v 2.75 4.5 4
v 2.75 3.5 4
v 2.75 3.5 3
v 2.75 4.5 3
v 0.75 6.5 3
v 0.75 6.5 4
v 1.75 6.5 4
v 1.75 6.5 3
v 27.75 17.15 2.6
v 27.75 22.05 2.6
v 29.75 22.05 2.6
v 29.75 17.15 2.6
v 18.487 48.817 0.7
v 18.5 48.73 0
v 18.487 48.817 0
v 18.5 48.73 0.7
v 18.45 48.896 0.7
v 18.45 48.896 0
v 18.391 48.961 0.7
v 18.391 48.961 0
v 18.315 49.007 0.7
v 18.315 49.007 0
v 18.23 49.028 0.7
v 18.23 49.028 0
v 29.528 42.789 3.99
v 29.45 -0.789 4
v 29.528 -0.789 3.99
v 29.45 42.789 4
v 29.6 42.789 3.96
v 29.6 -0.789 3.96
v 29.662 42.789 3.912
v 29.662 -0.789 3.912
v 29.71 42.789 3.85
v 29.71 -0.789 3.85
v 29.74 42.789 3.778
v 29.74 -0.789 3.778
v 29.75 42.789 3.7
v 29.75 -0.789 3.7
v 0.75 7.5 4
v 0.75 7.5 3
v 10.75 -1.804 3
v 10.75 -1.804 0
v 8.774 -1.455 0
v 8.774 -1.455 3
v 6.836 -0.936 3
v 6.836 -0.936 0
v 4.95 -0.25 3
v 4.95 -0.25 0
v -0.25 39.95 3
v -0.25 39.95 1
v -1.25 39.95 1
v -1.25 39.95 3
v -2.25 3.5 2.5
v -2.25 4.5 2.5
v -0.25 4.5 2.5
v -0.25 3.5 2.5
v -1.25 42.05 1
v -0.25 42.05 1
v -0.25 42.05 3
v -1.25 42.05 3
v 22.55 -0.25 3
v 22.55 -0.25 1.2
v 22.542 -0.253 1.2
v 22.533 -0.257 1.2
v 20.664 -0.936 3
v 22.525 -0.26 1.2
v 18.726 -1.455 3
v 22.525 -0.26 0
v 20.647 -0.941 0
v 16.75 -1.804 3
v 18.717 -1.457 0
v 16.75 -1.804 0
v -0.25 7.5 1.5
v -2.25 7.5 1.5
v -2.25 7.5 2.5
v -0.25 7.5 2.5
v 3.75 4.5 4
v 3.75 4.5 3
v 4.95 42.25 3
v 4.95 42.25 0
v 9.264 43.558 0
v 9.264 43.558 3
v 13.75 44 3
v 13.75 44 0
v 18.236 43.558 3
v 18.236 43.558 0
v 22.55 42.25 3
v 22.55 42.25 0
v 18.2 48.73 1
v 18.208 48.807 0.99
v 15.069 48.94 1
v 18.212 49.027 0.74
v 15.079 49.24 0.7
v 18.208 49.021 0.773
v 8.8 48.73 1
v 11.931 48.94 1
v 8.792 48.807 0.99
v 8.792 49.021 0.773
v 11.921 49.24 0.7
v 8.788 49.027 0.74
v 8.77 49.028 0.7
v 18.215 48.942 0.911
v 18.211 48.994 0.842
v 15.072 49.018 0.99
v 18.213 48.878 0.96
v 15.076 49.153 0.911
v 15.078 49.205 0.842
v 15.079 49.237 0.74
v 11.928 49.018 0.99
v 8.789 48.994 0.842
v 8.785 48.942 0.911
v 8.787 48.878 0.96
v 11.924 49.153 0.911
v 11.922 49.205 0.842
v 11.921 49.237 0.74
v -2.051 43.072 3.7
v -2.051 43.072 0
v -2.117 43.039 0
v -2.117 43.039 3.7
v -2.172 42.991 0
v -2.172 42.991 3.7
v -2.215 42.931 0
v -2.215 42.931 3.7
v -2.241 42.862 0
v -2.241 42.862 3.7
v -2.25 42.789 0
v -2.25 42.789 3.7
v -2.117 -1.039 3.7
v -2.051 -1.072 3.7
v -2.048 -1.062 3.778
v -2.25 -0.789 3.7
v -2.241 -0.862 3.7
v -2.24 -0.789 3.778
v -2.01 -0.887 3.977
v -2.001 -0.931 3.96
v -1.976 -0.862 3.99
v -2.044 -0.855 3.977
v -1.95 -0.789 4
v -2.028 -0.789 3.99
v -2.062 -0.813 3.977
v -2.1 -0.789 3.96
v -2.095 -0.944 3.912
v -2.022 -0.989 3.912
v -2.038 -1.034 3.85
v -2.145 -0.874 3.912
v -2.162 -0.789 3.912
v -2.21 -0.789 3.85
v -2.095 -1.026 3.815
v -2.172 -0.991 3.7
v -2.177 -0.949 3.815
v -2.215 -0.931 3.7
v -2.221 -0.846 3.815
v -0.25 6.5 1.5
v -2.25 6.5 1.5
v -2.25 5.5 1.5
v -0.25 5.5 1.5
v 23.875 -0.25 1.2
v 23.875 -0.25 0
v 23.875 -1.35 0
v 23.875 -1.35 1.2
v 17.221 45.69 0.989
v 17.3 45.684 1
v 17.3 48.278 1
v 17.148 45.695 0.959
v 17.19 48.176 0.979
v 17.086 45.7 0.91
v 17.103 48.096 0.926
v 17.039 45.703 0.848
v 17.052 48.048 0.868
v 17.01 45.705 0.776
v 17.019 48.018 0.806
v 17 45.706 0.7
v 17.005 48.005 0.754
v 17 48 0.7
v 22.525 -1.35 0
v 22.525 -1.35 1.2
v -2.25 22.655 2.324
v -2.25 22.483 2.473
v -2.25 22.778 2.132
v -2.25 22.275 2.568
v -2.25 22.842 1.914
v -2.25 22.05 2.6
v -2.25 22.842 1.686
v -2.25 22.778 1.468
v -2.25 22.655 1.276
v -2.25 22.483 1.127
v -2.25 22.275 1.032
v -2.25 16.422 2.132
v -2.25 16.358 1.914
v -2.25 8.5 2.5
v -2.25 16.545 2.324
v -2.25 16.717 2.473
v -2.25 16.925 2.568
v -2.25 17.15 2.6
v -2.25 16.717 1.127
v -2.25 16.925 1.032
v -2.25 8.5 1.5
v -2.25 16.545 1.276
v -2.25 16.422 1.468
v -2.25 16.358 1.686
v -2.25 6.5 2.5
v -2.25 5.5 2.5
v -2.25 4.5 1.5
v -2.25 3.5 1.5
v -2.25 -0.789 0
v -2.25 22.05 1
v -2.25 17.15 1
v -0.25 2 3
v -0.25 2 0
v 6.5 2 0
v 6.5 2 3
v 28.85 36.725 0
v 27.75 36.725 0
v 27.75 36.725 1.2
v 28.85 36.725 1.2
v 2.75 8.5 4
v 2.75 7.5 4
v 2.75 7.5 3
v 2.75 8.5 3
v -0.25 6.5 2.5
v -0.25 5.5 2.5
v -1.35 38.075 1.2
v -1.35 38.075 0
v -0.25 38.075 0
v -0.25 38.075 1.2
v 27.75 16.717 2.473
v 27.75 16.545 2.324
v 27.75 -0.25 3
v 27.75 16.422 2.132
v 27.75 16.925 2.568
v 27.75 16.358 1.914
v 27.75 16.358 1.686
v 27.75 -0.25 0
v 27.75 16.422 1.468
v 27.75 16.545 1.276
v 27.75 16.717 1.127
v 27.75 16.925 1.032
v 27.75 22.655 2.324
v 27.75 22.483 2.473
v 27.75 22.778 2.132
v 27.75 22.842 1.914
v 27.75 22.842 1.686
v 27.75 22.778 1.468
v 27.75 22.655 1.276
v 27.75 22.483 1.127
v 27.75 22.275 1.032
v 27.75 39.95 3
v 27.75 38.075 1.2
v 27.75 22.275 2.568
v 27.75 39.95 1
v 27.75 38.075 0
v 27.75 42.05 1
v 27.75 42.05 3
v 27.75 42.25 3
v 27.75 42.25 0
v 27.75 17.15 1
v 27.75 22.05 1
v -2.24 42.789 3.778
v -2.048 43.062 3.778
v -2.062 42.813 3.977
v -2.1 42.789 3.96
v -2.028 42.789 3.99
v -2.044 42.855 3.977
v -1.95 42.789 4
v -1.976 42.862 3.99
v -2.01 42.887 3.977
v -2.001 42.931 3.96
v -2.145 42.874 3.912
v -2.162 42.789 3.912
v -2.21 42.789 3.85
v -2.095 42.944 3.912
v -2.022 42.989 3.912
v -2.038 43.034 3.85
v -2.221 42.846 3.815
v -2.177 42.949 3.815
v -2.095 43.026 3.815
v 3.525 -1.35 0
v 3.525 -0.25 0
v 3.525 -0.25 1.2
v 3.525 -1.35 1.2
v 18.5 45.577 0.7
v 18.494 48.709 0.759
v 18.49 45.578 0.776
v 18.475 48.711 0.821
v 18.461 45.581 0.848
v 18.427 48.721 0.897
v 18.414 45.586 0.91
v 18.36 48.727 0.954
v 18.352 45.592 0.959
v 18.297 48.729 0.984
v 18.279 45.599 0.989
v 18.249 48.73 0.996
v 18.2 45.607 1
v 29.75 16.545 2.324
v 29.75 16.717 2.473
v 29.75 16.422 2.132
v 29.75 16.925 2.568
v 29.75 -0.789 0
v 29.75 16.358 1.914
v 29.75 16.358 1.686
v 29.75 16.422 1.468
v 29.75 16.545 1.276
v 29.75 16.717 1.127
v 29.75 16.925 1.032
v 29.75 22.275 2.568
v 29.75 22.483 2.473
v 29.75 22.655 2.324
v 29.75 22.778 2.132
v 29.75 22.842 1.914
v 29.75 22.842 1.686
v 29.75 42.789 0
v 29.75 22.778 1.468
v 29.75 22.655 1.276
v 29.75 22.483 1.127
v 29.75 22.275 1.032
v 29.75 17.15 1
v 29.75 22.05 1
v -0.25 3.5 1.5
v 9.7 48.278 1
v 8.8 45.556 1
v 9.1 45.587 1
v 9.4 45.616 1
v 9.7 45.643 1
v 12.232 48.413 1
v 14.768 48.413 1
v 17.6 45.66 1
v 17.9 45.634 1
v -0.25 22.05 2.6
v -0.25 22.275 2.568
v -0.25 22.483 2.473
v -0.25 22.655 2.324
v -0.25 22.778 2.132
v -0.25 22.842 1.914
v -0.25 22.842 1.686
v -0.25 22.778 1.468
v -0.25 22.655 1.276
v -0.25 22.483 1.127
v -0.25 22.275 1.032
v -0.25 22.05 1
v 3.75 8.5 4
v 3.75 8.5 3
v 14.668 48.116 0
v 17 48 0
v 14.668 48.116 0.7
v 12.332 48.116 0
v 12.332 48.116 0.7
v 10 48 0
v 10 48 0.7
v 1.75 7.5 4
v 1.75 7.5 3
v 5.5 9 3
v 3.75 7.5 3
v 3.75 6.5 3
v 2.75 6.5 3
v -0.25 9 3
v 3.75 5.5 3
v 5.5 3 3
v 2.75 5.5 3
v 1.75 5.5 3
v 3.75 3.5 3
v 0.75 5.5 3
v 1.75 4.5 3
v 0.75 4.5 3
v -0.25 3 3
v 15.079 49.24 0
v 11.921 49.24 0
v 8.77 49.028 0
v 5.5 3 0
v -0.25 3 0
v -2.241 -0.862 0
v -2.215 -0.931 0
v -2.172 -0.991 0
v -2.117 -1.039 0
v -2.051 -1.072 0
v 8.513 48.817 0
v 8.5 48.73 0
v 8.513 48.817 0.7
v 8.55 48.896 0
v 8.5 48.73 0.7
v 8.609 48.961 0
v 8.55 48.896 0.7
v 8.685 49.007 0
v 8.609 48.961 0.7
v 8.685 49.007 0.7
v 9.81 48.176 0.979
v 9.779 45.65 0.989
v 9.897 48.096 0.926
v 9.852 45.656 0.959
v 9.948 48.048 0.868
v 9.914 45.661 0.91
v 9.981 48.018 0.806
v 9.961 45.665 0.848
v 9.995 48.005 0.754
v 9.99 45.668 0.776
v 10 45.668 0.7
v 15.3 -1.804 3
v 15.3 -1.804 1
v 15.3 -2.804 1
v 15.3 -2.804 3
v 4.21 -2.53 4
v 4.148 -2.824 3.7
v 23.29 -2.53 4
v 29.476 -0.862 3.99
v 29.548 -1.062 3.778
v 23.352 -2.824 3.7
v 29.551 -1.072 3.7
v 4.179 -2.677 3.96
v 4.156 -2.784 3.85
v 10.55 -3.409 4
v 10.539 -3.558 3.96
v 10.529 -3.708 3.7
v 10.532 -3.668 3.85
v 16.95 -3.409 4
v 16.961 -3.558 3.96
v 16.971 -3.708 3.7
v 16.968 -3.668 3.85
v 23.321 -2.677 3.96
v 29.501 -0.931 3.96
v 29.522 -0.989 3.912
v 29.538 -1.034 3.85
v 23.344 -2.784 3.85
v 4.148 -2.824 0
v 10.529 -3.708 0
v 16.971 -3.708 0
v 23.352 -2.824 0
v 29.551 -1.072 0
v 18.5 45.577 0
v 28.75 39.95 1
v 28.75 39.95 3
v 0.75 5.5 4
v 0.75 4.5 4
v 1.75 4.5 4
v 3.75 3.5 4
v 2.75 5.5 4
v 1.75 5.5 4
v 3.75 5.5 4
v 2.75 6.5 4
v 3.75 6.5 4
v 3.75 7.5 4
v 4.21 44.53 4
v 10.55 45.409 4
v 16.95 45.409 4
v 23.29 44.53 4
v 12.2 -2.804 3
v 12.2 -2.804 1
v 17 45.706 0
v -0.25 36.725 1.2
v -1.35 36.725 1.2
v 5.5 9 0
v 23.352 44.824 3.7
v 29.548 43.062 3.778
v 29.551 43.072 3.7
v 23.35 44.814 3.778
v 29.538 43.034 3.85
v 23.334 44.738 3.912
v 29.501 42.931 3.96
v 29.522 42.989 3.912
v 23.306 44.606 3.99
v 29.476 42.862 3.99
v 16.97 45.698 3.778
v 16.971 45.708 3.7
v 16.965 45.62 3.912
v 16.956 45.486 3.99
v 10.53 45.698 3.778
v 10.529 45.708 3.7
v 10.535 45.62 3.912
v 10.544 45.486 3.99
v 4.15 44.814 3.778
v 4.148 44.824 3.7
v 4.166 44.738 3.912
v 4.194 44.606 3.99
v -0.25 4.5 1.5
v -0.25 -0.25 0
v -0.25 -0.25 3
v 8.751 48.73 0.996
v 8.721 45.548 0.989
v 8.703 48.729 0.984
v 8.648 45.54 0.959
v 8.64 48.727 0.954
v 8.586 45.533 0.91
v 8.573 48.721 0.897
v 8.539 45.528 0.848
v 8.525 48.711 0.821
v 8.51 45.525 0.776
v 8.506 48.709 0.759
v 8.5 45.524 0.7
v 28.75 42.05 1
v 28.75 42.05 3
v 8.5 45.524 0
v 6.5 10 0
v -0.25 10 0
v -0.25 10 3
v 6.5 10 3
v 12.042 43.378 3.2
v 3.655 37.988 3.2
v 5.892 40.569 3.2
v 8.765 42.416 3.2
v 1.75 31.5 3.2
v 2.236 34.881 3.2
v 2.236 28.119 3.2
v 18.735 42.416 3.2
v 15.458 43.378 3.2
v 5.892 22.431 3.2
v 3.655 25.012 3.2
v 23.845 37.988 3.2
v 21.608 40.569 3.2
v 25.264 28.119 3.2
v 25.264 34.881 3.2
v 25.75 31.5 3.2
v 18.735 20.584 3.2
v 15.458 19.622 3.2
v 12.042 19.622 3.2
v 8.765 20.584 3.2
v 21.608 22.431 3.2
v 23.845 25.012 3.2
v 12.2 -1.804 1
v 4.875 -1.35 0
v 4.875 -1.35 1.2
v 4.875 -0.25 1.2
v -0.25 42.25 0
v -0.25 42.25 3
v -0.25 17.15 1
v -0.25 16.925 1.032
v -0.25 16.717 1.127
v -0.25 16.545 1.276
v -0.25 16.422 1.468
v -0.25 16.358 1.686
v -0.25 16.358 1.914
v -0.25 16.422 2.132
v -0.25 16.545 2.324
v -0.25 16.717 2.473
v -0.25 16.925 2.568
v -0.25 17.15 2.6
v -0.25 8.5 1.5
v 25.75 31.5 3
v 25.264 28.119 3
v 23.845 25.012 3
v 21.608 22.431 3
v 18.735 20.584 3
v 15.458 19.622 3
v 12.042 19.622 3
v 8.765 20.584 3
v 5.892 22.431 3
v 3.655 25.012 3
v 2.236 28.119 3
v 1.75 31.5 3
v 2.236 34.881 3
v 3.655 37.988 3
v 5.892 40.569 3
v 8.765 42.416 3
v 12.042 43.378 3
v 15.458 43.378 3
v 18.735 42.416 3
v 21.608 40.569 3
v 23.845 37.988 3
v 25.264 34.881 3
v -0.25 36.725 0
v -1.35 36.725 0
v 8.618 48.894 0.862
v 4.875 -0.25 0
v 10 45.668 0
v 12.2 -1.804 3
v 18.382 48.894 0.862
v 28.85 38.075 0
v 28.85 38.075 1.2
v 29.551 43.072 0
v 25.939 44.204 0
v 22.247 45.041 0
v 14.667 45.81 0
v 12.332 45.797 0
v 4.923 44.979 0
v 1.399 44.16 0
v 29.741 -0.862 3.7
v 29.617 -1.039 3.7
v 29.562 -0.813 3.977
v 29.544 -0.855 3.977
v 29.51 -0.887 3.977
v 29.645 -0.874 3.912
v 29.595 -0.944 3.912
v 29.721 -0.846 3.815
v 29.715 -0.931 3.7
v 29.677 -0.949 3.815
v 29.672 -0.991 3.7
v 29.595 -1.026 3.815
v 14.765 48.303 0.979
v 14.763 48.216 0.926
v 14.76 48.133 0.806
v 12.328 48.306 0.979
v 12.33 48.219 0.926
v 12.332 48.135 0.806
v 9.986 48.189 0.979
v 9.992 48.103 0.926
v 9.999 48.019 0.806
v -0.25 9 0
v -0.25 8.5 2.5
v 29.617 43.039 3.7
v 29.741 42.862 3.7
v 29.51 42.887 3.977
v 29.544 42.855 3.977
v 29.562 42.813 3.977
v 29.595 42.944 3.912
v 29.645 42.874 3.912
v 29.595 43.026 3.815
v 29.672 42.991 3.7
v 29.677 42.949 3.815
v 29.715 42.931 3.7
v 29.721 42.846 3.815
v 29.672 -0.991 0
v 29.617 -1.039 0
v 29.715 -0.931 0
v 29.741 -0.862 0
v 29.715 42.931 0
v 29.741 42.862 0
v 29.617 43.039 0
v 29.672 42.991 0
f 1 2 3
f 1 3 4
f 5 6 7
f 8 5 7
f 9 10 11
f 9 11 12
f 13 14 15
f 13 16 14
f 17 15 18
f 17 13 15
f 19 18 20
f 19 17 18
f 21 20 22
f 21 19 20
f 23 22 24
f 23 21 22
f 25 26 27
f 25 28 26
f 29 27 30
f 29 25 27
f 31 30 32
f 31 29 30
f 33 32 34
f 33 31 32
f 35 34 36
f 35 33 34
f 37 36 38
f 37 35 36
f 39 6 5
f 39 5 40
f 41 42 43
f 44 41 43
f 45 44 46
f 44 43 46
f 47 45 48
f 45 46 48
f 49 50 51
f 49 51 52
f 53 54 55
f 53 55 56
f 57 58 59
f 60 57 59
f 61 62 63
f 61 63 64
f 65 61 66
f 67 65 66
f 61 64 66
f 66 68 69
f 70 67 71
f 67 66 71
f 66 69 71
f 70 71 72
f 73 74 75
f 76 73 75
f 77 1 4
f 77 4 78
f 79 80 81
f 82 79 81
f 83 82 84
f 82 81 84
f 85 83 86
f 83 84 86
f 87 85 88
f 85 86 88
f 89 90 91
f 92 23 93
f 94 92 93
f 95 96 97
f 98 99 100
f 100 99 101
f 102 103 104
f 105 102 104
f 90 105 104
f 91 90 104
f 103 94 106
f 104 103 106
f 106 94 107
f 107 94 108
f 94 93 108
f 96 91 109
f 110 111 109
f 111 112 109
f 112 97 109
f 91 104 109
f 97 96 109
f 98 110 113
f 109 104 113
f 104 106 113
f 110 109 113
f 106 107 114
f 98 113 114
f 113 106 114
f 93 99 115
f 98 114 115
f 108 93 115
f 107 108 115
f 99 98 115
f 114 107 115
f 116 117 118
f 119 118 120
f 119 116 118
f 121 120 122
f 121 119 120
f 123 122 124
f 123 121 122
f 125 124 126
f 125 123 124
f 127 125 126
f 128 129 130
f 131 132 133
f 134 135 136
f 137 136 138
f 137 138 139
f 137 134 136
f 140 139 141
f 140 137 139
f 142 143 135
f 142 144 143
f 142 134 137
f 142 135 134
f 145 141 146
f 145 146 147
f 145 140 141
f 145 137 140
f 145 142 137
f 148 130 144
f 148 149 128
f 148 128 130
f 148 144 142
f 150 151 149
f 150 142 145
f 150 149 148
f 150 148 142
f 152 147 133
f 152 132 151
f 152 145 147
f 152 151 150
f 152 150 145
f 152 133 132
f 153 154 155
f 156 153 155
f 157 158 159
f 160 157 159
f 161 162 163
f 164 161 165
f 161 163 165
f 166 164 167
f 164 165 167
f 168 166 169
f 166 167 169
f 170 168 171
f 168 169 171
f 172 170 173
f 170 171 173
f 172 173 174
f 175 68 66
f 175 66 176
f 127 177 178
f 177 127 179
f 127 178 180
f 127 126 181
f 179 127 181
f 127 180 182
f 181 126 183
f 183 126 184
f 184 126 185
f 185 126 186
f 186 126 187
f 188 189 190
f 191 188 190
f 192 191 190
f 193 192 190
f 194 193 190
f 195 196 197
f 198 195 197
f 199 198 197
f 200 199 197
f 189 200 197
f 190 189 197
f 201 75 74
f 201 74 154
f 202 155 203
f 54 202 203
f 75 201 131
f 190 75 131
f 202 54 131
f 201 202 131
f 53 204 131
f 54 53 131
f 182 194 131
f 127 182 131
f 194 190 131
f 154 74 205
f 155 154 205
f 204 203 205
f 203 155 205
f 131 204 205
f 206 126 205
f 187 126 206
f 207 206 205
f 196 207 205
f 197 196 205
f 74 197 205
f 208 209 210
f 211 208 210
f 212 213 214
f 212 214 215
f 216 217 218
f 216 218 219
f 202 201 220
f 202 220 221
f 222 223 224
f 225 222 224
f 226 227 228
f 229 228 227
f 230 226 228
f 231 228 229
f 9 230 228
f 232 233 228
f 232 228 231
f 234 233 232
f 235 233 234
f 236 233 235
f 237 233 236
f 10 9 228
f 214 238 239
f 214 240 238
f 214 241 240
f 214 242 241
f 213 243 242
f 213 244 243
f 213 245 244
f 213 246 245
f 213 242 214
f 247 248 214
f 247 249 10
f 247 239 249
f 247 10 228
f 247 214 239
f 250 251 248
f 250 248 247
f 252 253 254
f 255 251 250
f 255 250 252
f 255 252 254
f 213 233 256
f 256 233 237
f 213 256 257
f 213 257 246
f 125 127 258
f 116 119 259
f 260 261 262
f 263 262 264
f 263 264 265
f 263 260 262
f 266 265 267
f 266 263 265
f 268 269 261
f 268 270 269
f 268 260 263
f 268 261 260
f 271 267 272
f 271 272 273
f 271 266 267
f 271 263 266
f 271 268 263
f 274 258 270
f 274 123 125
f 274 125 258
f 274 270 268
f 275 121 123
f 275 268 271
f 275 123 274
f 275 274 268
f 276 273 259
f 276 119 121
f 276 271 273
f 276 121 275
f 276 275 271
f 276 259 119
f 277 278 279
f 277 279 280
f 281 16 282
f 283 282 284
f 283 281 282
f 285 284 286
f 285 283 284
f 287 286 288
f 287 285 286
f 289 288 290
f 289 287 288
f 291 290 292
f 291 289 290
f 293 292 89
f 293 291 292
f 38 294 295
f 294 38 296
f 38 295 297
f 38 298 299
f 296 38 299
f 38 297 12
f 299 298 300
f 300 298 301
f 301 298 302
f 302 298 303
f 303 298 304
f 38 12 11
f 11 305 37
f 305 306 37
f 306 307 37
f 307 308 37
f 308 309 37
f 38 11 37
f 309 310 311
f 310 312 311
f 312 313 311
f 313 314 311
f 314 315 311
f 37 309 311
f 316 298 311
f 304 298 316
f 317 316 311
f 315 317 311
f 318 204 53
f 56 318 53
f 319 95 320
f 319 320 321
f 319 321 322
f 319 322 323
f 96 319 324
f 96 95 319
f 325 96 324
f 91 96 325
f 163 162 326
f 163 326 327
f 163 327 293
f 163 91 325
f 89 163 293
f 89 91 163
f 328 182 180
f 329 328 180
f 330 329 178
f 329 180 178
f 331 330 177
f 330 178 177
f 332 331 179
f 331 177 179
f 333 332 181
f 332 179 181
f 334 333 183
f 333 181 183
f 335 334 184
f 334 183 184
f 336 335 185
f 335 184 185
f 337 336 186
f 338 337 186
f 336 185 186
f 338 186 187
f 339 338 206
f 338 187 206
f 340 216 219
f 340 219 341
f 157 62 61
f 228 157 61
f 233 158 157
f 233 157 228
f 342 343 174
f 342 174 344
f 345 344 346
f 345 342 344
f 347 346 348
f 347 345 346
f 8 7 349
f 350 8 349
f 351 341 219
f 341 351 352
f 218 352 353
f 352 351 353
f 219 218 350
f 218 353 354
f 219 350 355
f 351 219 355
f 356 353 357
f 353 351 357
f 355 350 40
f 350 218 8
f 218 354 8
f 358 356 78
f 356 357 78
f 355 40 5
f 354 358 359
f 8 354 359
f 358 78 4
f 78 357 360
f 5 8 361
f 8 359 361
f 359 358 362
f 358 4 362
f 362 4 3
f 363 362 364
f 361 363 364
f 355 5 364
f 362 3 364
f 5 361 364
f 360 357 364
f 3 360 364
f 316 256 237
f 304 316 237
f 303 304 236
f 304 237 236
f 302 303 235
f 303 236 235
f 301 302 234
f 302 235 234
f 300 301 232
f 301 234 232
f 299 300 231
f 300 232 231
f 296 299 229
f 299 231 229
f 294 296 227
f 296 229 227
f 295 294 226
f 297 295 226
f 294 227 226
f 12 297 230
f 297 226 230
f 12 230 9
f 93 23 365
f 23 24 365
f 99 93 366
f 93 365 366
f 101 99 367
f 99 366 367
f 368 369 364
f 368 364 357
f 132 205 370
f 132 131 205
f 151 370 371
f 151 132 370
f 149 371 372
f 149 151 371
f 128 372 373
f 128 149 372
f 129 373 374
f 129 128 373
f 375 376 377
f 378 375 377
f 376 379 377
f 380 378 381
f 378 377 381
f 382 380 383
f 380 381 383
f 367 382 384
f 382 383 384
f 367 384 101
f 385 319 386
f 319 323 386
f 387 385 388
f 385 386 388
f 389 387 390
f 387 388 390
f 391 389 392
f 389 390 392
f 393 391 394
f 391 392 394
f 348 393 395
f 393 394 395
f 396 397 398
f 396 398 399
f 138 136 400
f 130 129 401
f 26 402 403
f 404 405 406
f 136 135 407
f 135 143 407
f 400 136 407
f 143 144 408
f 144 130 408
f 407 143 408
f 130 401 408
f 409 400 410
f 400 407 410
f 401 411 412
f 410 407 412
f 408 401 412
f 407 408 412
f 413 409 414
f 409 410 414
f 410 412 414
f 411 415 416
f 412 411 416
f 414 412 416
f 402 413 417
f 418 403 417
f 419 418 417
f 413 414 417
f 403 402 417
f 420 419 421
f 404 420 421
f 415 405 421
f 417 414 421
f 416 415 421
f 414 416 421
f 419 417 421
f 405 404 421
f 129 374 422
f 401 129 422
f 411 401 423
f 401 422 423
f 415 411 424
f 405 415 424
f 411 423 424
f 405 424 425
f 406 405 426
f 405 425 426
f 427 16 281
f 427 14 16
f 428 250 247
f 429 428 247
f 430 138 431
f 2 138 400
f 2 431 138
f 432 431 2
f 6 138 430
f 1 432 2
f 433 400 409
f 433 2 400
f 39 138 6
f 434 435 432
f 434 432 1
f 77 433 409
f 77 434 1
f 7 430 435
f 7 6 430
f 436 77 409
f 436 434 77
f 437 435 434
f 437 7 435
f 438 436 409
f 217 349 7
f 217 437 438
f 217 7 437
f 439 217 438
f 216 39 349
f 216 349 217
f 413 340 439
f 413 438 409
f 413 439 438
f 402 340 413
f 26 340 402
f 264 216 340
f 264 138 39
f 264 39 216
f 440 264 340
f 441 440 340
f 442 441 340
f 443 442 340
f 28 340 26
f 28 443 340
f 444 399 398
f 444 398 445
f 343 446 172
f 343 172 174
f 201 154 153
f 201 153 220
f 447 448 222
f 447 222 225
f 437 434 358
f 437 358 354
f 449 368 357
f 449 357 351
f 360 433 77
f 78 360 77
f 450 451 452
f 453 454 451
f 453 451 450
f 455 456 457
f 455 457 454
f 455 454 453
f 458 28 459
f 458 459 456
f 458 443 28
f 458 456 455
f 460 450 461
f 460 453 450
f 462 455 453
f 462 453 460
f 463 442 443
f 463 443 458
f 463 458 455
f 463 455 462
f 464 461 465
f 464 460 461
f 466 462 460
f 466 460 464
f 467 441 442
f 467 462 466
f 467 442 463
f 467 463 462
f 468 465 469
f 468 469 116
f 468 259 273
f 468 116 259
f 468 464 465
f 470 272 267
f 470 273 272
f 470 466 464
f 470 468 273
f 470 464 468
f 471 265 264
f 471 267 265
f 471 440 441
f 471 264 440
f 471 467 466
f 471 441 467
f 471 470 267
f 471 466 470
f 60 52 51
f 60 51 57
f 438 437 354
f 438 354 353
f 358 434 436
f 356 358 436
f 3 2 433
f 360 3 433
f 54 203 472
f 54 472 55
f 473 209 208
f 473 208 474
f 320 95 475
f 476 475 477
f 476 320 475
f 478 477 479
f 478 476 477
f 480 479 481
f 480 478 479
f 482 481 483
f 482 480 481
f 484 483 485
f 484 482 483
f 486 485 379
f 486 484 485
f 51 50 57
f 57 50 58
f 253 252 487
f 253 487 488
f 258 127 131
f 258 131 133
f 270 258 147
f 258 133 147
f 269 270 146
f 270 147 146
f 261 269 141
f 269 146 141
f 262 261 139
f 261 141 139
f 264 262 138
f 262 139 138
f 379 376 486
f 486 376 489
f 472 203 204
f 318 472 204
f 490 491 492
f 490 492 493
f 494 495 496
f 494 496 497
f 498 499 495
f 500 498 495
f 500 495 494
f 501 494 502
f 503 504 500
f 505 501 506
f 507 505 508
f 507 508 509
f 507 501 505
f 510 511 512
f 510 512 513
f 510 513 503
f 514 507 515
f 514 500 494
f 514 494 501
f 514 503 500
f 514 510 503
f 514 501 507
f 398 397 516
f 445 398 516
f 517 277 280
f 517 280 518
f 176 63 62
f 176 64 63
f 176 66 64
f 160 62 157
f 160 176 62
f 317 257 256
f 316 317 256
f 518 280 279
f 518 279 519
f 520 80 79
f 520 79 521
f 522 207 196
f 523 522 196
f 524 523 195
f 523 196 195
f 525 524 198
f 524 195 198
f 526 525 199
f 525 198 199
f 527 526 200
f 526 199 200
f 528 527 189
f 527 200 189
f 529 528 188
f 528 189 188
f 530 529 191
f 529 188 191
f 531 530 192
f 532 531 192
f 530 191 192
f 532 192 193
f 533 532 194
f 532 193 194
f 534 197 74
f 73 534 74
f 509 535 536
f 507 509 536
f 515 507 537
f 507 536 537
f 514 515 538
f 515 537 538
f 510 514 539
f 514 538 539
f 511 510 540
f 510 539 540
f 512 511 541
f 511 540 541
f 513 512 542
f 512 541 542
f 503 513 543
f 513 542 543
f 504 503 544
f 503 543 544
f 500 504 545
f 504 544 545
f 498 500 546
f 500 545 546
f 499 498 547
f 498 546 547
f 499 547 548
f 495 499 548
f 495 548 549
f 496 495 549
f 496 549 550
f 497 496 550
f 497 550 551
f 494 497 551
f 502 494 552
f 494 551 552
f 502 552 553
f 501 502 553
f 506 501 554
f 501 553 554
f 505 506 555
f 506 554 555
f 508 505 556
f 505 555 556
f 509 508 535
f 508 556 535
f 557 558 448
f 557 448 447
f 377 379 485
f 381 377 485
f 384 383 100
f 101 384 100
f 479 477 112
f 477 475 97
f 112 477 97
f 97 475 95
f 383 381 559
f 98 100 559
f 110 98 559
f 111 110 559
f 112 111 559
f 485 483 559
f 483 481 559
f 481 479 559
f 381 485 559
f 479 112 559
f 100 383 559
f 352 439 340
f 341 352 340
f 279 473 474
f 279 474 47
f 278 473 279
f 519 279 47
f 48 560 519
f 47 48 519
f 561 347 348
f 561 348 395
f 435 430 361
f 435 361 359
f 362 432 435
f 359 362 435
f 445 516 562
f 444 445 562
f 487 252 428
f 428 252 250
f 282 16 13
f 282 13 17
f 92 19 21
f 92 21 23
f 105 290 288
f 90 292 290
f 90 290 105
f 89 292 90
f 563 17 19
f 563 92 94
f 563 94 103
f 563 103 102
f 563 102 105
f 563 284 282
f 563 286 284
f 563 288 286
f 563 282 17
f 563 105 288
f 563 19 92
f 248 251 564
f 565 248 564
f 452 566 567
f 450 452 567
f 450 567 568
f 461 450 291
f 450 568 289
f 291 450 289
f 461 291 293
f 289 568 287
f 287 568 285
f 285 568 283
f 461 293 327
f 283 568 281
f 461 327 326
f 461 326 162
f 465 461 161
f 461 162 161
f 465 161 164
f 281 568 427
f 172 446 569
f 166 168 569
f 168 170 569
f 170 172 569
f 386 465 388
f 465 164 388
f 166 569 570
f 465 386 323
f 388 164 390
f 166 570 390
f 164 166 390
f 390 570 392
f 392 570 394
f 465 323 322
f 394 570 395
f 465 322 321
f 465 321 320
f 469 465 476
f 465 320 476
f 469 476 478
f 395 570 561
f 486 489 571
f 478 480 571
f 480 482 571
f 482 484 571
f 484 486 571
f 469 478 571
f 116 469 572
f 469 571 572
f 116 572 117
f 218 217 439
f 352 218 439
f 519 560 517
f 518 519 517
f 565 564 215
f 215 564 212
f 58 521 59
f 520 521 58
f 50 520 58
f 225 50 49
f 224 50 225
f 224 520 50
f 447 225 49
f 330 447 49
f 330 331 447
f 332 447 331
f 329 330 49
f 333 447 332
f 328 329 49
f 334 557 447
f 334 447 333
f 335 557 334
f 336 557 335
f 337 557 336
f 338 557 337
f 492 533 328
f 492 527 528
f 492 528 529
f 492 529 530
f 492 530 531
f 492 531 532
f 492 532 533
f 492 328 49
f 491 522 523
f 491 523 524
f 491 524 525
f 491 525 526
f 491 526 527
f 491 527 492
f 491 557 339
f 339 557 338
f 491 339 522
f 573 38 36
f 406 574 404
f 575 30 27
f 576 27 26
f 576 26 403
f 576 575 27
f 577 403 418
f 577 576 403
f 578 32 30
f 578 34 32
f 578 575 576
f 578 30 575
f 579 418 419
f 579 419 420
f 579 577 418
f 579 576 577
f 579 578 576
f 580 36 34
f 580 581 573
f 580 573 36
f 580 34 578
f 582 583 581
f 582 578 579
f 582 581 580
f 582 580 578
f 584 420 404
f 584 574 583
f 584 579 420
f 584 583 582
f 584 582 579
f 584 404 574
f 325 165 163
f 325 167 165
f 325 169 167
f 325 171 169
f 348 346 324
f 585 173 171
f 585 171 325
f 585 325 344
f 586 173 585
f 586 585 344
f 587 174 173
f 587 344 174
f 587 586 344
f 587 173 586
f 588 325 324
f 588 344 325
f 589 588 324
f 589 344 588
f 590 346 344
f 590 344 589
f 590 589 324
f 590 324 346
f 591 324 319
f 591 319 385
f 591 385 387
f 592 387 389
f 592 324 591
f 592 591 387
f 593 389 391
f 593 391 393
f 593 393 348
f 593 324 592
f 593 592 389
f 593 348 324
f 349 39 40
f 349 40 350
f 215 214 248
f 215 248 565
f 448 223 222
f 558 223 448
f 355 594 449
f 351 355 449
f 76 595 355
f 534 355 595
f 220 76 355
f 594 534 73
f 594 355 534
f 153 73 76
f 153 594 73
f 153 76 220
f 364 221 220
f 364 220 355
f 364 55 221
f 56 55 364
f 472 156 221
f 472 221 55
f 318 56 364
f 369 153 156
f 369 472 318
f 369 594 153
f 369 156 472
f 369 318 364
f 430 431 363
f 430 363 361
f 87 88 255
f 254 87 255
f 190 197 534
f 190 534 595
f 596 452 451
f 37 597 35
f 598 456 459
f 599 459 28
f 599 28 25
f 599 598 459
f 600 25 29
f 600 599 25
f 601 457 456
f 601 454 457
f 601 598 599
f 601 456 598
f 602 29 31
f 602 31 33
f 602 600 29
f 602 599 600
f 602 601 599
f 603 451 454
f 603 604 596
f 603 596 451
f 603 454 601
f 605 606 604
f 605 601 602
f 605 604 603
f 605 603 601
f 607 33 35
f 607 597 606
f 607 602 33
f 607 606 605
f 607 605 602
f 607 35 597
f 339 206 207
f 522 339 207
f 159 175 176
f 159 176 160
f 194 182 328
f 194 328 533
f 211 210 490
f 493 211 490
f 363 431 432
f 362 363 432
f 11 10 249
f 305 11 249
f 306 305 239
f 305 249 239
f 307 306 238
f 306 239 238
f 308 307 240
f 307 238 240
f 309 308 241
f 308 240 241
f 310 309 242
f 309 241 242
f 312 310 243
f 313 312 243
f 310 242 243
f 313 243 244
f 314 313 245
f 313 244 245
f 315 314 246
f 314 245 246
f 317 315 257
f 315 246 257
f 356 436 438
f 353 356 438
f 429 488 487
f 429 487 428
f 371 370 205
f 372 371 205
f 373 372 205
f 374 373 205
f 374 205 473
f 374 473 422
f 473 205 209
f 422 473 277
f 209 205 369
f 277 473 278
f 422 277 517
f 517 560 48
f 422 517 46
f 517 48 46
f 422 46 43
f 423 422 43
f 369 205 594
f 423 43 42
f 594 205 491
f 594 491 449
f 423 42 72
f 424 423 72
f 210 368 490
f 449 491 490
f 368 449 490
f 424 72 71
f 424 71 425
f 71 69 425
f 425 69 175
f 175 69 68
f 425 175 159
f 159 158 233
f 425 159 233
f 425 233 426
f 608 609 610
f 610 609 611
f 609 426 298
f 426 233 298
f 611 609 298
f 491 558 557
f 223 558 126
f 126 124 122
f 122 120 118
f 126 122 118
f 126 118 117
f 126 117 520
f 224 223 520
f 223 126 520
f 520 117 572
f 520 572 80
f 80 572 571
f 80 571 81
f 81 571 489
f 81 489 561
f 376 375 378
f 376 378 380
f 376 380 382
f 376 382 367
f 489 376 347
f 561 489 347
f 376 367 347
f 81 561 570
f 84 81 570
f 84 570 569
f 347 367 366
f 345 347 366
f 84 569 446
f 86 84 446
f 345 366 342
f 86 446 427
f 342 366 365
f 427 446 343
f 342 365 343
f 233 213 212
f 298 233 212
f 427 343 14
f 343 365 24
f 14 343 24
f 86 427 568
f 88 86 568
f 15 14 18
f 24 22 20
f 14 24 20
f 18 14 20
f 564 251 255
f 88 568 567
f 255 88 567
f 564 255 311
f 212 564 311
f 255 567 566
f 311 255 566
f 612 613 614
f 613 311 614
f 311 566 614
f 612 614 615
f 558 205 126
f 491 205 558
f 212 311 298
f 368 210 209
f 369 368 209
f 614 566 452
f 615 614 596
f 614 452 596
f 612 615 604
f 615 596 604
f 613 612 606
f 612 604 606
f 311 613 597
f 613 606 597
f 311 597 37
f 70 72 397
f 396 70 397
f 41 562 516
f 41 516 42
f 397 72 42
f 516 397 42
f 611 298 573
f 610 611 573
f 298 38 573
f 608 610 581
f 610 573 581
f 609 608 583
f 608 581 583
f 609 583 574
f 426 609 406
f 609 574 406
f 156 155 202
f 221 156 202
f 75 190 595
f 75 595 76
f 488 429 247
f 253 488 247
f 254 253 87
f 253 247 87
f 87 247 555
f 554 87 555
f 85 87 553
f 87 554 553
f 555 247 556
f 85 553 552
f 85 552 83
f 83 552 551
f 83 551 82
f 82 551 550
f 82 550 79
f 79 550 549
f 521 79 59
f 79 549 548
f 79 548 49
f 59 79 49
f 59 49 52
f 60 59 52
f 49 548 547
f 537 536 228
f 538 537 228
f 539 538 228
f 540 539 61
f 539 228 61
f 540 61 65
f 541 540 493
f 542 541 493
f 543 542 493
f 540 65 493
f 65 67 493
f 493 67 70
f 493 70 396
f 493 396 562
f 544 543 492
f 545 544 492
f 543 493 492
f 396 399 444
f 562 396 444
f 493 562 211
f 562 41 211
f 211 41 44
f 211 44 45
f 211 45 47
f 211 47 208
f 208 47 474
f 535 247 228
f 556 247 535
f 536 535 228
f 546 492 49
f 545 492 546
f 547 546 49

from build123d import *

# Parameters (mm, degrees)
PAD_DEPTH       = 4
POCKET003_DEPTH = 3
POCKET004_DEPTH = 32.001
SKETCH012_W     = 3.1
SKETCH012_H     = 2
POCKET006_DEPTH = 1
SKETCH013_W     = 2.1
SKETCH013_H     = 2
POCKET007_DEPTH = 1
SKETCH014_W     = 2.1
SKETCH014_H     = 2
POCKET008_DEPTH = 1
SKETCH016_W     = 1
SKETCH016_H     = 1
POCKET009_DEPTH = 2
SKETCH018_W     = 1
SKETCH018_H     = 1
POCKET010_DEPTH = 1
SKETCH021_R     = 12
POCKET011_DEPTH = 0.2
SKETCH024_W     = 1.35
SKETCH024_H     = 1.1
SKETCH024_W_2   = 1.1
SKETCH024_H_2   = 1.35
POCKET012_DEPTH = 1.2
BOX009_W        = 1
BOX009_H        = 8
BOX009_DEPTH    = 3
BOX010_W        = 6
BOX010_H        = 1
BOX010_DEPTH    = 3
BOX008_W        = 6
BOX008_H        = 1
BOX008_DEPTH    = 3
PAD007_DEPTH    = 1
FILLET_R        = 0.3
FILLET009_R     = 0.3


with BuildPart() as pocket012:
    # Sketch001 → Pad (new body)
    with BuildSketch(Plane(origin=(13.75, 21, 0), x_dir=(1, 0, 0), z_dir=(0, 0, 1))):
        with BuildLine():
            ThreePointArc((16, 22), (0, 24.8188), (-16, 22))
            Line((-16, 22), (-16, -22))
            ThreePointArc((-16, -22), (0, -24.8188), (16, -22))
            Line((16, -22), (16, 22))
        make_face()
    extrude(amount=PAD_DEPTH)

    # Sketch005 → Pocket003 (cut)
    with BuildSketch(Plane(origin=(13.75, 21, 0), x_dir=(1, 0, 0), z_dir=(0, 0, -1))):
        with BuildLine():
            Line((14, 21.25), (14, -21.25))
            Line((8.799858, -21.25), (14, -21.25))
            ThreePointArc((-8.799858, -21.25), (0, -23), (8.799858, -21.25))
            Line((-8.799858, -21.25), (-14, -21.25))
            Line((-14, -21.25), (-14, 21.25))
            Line((-14, 21.25), (-8.799858, 21.25))
            ThreePointArc((-3, 22.803509), (-5.950841, 22.216829), (-8.799858, 21.25))
            Line((3, 22.803509), (-3, 22.803509))
            ThreePointArc((8.799858, 21.25), (5.950841, 22.216829), (3, 22.803509))
            Line((8.799858, 21.25), (14, 21.25))
        make_face()
    extrude(amount=-POCKET003_DEPTH, mode=Mode.SUBTRACT)

    # Sketch007 → Pocket004 (cut, through all)
    with BuildSketch(Plane(origin=(-2.25, 21, 0), x_dir=(0, -1, 0), z_dir=(-1, 0, 0))):
        with BuildLine():
            ThreePointArc((-1.05, 2.6), (-1.85, 1.8), (-1.05, 1))
            Line((-1.05, 1), (3.85, 1))
            ThreePointArc((3.85, 1), (4.65, 1.8), (3.85, 2.6))
            Line((-1.05, 2.6), (3.85, 2.6))
        make_face()
    extrude(amount=-POCKET004_DEPTH, mode=Mode.SUBTRACT)

    # Sketch012 → Pocket006 (cut)
    with BuildSketch(Plane(origin=(13.75, -1.803509, 0), x_dir=(-1, 0, 0), z_dir=(0, 1, 0))):
        with Locations((0, 2)):
            Rectangle(SKETCH012_W, SKETCH012_H)
    extrude(amount=-POCKET006_DEPTH, mode=Mode.SUBTRACT)

    # Sketch013 → Pocket007 (cut)
    with BuildSketch(Plane(origin=(-0.25, 21, 0), x_dir=(0, 1, 0), z_dir=(1, 0, 0))):
        with Locations((20, 2)):
            Rectangle(SKETCH013_W, SKETCH013_H)
    extrude(amount=-POCKET007_DEPTH, mode=Mode.SUBTRACT)

    # Sketch014 → Pocket008 (cut)
    with BuildSketch(Plane(origin=(27.75, 21, 0), x_dir=(0, -1, 0), z_dir=(-1, 0, 0))):
        with Locations((-20, 2)):
            Rectangle(SKETCH014_W, SKETCH014_H)
    extrude(amount=-POCKET008_DEPTH, mode=Mode.SUBTRACT)

    # Sketch016 → Pocket009 (cut)
    with BuildSketch(Plane(origin=(-2.25, 21, 0), x_dir=(0, -1, 0), z_dir=(-1, 0, 0))):
        with Locations((13, 2)):
            Rectangle(SKETCH016_W, SKETCH016_H)
        with Locations((15, 2)):
            Rectangle(SKETCH016_W, SKETCH016_H)
        with Locations((17, 2)):
            Rectangle(SKETCH016_W, SKETCH016_H)
    extrude(amount=-POCKET009_DEPTH, mode=Mode.SUBTRACT)

    # Sketch018 → Pocket010 (cut)
    with BuildSketch(Plane(origin=(13.75, 21, 4), x_dir=(1, 0, 0), z_dir=(0, 0, 1))):
        with Locations((-10.5, -13)):
            Rectangle(SKETCH018_W, SKETCH018_H)
        with Locations((-10.5, -15)):
            Rectangle(SKETCH018_W, SKETCH018_H)
        with Locations((-10.5, -17)):
            Rectangle(SKETCH018_W, SKETCH018_H)
        with Locations((-12.5, -14)):
            Rectangle(SKETCH018_W, SKETCH018_H)
        with Locations((-12.5, -16)):
            Rectangle(SKETCH018_W, SKETCH018_H)
    extrude(amount=-POCKET010_DEPTH, mode=Mode.SUBTRACT)

    # Sketch021 → Pocket011 (cut)
    with BuildSketch(Plane(origin=(13.75, 21, 3), x_dir=(1, 0, 0), z_dir=(0, 0, -1))):
        with Locations((0, -10.5)):
            Circle(SKETCH021_R)
    extrude(amount=-POCKET011_DEPTH, mode=Mode.SUBTRACT)

    # Sketch024 → Pocket012 (cut)
    with BuildSketch(Plane(origin=(13.75, 21, 0), x_dir=(1, 0, 0), z_dir=(0, 0, -1))):
        with Locations((-9.55, 21.8)):
            Rectangle(SKETCH024_W, SKETCH024_H)
        with Locations((9.45, 21.8)):
            Rectangle(SKETCH024_W, SKETCH024_H)
        with Locations((-14.55, -16.4)):
            Rectangle(SKETCH024_W_2, SKETCH024_H_2)
        with Locations((14.55, -16.4)):
            Rectangle(SKETCH024_W_2, SKETCH024_H_2)
    extrude(amount=-POCKET012_DEPTH, mode=Mode.SUBTRACT)


with BuildPart() as box009:
    # Box009 → Box009 (new body)
    with BuildSketch(Plane(origin=(5.5, 2, 0), x_dir=(1, 0, 0), z_dir=(0, 0, 1))):
        with Locations((0.5, 4)):
            Rectangle(BOX009_W, BOX009_H)
    extrude(amount=BOX009_DEPTH)


with BuildPart() as box010:
    # Box010 → Box010 (new body)
    with BuildSketch(Plane(origin=(-0.5, 2, 0), x_dir=(1, 0, 0), z_dir=(0, 0, 1))):
        with Locations((3, 0.5)):
            Rectangle(BOX010_W, BOX010_H)
    extrude(amount=BOX010_DEPTH)


with BuildPart() as fusion013:
    # Box008 → Box008 (new body)
    with BuildSketch(Plane(origin=(-0.5, 9, 0), x_dir=(1, 0, 0), z_dir=(0, 0, 1))):
        with Locations((3, 0.5)):
            Rectangle(BOX008_W, BOX008_H)
    extrude(amount=BOX008_DEPTH)

    # Fusion012: union Box009, Box010
    add(box009.part)
    add(box010.part)

    # Fusion013: union Pocket012
    add(pocket012.part)


with BuildPart() as fillet009:
    # Sketch025 → Pad007 (new body)
    with BuildSketch(Plane(origin=(13.5, 1, 0), x_dir=(1, 0, 0), z_dir=(0, 0, 1))):
        with BuildLine():
            ThreePointArc((5, 48), (0, 48.266714), (-5, 48))
            Line((-5, 48), (-5, 44))
            Line((-5, 44), (-3.5, 44))
            Line((-3.5, 47), (-3.5, 44))
            ThreePointArc((3.5, 47), (0, 47.130139), (-3.5, 47))
            Line((3.5, 44), (3.5, 47))
            Line((5, 44), (3.5, 44))
            Line((5, 48), (5, 44))
        make_face()
    extrude(amount=PAD007_DEPTH)

    # Fusion014: union Fusion013
    add(fusion013.part)

    # Fillet
    fillet_edges = [fillet009.edges().sort_by_distance(p)[0] for p in [
        (13.75, 45.8188, 4),
        (29.75, 21, 4),
        (29.75, 43, 2),
        (18.5, 47.28861, 1),
        (13.5, 49.266714, 1),
        (8.5, 47.261758, 1),
        (10, 46.834189, 1),
        (13.5, 48.130139, 1),
        (17, 46.852931, 1),
        (-2.25, 43, 2),
        (-2.25, 21, 4),
        (-2.25, -1, 2),
        (13.75, -3.8188, 4),
        (29.75, -1, 2),
    ]]
    fillet(fillet_edges, radius=FILLET_R)

    # Fillet009
    fillet009_edges = [fillet009.edges().sort_by_distance(p)[0] for p in [
        (8.5, 49, 0.35),
        (18.5, 49, 0.35),
    ]]
    fillet(fillet009_edges, radius=FILLET009_R)


solid = fillet009.part
